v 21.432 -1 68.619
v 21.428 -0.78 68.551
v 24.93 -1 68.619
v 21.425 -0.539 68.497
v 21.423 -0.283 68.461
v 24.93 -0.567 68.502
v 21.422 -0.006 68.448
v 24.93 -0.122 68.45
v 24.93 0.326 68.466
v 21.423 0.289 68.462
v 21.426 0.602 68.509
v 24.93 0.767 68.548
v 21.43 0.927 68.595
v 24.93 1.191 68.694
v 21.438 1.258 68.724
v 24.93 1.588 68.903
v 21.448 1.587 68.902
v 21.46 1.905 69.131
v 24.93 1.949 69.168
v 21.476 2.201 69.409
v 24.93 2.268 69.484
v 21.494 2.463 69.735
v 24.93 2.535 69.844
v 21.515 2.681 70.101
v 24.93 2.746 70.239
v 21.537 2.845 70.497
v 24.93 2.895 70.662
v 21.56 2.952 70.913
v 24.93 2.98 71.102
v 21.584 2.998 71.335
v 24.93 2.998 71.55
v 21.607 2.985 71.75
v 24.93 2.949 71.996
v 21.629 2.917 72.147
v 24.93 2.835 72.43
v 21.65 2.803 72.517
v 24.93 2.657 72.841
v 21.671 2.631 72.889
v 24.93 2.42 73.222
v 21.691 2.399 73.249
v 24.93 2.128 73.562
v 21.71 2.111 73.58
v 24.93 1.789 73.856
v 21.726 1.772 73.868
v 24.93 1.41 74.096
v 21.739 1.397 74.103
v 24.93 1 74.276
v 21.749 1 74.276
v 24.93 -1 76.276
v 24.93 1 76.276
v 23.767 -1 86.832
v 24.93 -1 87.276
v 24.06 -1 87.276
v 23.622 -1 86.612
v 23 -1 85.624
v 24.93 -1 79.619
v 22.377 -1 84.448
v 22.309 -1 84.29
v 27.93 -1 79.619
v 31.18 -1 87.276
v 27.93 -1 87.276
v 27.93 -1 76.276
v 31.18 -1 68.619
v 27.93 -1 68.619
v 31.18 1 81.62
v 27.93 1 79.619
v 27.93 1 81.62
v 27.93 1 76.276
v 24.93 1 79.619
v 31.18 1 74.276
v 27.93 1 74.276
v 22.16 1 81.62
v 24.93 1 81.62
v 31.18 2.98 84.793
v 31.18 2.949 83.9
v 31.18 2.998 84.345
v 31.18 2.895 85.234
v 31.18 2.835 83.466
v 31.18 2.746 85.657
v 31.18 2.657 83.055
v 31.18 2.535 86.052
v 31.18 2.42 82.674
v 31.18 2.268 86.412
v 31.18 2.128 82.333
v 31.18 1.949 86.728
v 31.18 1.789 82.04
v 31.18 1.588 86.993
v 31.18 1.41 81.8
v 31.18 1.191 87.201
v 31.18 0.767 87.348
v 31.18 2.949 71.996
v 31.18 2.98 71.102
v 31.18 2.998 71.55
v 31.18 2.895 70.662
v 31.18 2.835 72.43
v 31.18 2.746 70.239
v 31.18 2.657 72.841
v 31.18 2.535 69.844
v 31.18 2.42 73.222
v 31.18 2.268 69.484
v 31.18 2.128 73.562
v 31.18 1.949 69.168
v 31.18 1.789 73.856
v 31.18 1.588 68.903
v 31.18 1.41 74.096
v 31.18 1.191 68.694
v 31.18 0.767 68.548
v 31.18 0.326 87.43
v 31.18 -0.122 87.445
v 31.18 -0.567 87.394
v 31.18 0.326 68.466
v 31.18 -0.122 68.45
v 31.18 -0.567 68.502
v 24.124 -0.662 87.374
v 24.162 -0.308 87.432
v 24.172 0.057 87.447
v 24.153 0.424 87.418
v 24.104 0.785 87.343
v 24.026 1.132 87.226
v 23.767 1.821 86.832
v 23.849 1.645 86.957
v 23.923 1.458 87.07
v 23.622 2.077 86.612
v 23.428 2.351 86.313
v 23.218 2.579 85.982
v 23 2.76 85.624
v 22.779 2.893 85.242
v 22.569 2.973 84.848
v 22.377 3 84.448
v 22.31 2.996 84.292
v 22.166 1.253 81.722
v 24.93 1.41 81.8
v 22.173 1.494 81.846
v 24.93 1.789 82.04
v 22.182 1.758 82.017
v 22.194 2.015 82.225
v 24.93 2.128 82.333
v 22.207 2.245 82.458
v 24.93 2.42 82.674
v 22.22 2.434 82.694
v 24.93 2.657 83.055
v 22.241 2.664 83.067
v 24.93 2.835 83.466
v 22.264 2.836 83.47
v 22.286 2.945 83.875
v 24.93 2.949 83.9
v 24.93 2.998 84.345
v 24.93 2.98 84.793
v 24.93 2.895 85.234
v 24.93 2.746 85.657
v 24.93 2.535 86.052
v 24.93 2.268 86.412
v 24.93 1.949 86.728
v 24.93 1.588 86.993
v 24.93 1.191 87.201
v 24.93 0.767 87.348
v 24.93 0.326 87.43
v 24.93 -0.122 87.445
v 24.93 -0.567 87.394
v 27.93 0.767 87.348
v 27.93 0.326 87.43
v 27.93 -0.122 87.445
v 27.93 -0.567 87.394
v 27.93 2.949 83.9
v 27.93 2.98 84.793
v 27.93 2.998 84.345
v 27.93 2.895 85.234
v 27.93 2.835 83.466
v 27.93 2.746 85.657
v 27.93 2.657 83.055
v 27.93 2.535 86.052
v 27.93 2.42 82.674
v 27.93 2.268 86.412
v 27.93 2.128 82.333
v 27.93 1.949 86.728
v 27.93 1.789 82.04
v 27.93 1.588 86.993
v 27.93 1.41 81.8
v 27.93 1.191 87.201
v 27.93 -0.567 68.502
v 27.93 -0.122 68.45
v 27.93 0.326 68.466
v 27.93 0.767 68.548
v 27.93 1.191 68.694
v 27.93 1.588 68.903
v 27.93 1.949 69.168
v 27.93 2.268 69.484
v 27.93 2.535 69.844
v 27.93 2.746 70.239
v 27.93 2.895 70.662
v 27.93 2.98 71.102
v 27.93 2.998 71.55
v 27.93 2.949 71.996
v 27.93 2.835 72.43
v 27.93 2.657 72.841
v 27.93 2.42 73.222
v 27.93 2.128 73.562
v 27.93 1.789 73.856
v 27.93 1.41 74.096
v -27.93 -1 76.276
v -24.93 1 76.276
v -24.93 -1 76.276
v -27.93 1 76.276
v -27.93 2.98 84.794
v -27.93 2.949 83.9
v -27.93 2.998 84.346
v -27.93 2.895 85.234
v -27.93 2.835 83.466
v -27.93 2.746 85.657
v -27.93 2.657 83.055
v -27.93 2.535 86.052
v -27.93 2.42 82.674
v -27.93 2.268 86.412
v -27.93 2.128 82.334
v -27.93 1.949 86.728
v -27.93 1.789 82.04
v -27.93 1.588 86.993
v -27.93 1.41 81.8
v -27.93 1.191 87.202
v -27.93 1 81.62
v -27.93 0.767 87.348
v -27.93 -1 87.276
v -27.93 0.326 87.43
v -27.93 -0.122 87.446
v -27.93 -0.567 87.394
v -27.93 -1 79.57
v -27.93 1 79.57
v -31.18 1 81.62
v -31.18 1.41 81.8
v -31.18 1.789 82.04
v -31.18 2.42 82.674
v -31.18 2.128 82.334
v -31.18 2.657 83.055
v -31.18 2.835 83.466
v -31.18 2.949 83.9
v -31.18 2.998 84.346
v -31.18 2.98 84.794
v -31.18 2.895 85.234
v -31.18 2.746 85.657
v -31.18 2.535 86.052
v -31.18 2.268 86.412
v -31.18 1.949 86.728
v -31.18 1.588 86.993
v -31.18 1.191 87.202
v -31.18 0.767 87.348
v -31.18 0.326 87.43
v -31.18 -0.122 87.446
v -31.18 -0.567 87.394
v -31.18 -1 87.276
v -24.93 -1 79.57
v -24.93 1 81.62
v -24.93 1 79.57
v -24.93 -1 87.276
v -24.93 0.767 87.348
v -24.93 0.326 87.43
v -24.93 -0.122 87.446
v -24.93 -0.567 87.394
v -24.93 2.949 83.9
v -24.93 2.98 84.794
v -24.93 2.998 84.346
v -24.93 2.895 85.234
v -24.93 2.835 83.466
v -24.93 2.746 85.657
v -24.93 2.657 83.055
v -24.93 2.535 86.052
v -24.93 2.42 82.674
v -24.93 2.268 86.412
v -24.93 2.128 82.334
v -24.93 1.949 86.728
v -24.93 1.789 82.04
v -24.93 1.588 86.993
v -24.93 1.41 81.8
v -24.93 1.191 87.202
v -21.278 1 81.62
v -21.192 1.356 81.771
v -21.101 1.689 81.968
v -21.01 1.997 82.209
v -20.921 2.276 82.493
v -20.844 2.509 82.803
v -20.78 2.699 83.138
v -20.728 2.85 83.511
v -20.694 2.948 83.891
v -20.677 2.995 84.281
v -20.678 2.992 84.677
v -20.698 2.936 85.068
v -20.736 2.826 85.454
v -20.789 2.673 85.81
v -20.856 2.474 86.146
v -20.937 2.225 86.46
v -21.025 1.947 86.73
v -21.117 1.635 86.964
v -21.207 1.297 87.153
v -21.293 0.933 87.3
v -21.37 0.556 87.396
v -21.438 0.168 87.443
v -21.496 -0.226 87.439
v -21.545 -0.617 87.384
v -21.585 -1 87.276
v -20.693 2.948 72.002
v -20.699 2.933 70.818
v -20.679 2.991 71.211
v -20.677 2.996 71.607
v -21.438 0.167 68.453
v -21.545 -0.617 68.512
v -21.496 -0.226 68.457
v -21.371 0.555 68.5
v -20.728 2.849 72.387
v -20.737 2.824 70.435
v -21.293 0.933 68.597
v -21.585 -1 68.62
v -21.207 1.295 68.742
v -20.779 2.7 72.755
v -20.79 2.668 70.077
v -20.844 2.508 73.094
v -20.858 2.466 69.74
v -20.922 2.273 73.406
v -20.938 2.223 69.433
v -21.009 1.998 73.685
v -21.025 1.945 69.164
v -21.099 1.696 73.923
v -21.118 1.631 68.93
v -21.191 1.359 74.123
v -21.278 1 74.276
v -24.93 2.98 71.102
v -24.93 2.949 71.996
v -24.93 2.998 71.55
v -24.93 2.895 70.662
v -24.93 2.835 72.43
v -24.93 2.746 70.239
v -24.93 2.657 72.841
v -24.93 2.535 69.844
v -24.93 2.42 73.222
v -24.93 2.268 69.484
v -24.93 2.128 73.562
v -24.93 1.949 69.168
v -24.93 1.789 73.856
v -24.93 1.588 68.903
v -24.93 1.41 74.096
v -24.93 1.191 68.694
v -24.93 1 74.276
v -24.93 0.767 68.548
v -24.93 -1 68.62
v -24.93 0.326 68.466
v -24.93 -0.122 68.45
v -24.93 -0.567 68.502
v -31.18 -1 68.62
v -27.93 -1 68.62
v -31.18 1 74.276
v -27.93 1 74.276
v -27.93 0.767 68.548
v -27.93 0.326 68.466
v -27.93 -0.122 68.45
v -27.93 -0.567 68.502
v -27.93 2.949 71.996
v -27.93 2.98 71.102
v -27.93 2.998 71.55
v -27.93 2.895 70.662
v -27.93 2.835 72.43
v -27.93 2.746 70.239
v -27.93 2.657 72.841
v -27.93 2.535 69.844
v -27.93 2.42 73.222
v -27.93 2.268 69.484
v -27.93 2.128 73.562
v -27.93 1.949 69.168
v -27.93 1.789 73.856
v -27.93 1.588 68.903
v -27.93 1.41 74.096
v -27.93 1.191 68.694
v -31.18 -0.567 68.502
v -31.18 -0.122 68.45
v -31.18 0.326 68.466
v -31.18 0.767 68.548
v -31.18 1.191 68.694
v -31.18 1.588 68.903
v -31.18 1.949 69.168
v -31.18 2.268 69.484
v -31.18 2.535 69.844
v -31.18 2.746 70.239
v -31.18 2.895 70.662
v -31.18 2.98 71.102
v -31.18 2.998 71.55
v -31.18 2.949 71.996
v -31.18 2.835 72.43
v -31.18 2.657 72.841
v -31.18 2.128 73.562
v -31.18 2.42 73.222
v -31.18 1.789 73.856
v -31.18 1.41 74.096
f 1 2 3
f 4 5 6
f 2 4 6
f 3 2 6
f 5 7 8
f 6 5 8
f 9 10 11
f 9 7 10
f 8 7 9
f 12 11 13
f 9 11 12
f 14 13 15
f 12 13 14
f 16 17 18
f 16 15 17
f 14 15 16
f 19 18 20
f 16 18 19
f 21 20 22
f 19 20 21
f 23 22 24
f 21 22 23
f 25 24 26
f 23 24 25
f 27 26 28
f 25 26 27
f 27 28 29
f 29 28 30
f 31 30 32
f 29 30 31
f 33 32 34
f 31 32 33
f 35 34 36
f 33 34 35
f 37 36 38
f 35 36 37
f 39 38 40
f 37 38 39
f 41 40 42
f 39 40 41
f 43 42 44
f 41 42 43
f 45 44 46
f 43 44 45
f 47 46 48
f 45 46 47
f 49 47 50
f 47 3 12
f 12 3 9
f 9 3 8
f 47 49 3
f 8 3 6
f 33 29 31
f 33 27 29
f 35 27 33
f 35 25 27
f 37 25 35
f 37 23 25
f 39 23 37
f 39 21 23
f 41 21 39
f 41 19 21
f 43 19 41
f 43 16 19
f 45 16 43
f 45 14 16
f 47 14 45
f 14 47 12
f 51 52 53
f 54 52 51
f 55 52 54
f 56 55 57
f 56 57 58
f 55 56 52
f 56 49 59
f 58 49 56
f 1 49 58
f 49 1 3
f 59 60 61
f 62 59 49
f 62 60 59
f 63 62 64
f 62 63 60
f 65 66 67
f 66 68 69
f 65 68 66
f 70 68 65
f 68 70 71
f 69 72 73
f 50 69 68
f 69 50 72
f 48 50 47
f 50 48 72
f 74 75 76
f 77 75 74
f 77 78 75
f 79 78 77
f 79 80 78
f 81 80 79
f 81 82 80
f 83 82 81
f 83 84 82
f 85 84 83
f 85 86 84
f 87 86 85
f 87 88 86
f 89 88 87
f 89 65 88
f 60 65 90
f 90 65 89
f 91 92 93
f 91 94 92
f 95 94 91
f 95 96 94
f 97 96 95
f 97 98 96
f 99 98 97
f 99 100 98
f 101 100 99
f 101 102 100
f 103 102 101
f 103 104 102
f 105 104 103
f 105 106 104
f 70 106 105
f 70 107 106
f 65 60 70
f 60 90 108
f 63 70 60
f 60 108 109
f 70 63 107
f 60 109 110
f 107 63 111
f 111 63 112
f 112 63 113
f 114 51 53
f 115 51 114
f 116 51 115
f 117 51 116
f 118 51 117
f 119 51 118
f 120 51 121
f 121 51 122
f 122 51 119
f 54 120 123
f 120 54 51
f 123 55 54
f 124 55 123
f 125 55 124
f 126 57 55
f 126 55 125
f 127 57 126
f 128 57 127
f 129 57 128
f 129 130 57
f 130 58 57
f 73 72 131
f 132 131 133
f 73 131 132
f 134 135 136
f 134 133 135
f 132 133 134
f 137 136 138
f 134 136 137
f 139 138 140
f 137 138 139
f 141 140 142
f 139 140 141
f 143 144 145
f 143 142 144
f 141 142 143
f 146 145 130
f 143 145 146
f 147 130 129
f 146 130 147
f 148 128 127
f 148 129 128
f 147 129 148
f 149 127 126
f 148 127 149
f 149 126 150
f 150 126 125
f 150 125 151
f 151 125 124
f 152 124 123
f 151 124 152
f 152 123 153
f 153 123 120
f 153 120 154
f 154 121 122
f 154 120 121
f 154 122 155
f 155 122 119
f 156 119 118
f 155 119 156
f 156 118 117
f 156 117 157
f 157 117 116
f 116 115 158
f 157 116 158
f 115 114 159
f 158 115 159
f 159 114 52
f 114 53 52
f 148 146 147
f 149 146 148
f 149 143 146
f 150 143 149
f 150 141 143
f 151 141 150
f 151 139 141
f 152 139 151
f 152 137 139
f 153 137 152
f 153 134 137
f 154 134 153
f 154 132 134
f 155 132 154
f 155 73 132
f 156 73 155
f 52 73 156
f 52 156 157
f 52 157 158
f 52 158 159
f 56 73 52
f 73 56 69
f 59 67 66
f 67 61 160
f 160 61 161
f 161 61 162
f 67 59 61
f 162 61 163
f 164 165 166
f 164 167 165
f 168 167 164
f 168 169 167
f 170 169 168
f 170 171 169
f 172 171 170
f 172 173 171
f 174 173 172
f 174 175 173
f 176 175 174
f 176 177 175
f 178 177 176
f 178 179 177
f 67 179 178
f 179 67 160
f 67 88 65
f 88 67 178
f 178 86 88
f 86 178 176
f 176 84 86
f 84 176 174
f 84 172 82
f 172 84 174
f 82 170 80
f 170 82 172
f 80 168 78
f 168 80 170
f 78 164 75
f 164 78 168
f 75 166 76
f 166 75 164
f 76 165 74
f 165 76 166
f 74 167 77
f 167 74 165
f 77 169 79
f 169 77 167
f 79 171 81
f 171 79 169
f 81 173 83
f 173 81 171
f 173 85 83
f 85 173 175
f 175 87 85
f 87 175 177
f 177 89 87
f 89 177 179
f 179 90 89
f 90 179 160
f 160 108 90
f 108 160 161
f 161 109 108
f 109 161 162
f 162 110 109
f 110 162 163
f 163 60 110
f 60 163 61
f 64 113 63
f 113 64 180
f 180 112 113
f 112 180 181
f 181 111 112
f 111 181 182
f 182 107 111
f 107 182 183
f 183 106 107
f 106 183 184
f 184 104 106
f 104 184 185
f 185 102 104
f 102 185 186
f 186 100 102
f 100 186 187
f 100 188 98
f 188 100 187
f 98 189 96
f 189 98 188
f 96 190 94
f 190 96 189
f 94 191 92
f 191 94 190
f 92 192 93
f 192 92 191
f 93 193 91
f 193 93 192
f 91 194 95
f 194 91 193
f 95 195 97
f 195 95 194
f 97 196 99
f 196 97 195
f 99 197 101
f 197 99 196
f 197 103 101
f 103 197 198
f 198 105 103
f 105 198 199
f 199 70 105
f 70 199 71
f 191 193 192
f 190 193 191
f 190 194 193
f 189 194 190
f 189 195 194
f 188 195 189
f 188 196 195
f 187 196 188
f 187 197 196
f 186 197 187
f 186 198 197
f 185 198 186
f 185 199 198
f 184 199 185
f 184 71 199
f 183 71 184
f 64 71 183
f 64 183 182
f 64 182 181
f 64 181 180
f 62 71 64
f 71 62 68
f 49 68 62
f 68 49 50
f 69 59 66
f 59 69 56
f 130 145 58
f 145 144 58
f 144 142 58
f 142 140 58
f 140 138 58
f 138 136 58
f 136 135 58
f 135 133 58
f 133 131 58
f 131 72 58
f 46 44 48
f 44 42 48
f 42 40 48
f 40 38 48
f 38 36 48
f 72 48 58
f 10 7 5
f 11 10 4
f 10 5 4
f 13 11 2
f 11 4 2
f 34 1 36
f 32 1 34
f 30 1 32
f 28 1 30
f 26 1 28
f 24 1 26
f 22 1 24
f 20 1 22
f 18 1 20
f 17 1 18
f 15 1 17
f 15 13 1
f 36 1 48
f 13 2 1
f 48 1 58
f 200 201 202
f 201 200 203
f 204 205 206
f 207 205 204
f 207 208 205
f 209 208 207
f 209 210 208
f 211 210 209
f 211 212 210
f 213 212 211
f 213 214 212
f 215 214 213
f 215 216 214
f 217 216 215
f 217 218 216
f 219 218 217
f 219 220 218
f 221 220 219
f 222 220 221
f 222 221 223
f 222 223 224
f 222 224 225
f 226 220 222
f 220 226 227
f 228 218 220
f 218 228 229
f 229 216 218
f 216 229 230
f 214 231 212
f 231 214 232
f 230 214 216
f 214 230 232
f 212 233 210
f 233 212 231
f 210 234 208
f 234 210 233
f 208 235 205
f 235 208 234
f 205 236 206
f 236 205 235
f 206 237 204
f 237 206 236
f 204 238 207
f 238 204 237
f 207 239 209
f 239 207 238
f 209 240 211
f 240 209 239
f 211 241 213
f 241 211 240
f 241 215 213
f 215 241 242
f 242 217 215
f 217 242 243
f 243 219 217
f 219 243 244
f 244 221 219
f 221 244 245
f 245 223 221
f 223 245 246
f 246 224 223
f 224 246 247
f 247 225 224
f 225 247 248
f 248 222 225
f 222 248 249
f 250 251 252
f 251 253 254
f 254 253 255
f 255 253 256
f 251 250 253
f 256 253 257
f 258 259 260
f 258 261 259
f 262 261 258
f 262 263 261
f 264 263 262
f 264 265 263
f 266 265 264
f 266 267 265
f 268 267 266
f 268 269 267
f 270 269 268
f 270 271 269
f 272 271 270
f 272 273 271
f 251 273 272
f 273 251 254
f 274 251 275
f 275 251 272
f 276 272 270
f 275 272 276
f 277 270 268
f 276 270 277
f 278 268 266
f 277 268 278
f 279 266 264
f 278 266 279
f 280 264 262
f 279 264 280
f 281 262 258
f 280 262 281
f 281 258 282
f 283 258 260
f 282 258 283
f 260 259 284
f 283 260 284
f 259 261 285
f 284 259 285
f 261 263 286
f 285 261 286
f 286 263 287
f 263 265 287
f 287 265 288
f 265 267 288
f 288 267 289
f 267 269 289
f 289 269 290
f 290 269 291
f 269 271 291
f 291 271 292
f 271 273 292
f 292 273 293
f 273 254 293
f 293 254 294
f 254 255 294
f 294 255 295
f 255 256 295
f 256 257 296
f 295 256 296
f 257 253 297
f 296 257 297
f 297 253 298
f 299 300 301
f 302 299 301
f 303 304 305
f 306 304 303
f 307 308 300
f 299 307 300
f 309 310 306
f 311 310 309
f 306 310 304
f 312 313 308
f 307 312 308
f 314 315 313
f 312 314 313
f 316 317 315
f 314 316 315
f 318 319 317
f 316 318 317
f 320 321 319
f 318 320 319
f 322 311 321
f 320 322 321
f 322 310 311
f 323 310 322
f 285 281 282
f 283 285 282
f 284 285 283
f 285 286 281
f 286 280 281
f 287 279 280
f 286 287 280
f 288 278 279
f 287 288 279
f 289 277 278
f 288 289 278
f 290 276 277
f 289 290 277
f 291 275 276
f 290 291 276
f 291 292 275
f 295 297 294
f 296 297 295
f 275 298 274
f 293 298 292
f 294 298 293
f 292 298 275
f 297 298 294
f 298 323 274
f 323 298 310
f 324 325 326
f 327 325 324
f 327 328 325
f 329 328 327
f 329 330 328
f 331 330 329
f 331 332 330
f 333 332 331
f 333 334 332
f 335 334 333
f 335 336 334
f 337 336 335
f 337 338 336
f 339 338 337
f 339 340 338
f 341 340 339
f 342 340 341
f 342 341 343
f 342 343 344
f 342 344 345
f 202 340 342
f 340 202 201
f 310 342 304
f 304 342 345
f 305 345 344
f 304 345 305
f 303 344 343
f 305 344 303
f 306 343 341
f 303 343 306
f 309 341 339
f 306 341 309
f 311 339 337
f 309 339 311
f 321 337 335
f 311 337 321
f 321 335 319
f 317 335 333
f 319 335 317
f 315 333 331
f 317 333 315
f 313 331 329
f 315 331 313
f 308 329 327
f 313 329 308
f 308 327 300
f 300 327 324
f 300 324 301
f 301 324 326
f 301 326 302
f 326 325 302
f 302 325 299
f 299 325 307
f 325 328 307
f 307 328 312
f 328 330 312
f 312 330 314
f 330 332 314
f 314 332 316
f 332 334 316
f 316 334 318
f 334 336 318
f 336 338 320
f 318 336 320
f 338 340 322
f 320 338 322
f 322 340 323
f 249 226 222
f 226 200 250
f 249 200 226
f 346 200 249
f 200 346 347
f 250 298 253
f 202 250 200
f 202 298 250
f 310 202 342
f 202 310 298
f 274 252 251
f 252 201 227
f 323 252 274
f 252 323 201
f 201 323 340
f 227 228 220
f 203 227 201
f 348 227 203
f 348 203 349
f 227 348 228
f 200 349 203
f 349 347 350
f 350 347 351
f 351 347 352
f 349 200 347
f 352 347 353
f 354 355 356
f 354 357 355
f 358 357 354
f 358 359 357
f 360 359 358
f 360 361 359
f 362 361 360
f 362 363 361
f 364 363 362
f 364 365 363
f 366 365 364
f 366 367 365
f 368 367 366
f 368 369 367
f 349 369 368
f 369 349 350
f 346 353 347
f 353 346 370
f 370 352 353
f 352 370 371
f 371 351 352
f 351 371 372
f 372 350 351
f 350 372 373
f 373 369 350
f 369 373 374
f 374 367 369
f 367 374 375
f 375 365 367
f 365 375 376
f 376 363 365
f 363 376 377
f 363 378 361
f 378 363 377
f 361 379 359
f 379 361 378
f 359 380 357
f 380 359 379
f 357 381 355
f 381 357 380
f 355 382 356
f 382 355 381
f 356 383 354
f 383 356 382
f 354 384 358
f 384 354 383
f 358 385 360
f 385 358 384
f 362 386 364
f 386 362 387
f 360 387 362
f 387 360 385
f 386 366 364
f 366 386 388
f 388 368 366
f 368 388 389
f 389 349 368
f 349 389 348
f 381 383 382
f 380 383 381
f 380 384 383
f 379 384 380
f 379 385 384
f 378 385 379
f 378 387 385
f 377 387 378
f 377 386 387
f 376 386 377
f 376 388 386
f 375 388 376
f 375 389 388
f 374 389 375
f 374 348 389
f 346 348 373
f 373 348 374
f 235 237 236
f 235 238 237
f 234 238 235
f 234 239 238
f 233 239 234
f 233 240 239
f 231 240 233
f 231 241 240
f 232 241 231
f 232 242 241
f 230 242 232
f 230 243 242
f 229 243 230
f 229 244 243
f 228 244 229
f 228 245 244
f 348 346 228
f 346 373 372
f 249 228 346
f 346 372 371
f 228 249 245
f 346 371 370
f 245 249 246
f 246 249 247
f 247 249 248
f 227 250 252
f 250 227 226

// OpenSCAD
// kinetic_hand_wrist.scad
// Wrist hinges — Kinetic Hand RH60
//
// Parts: wrist_hinge_1.stl (right/+X side), wrist_hinge_2.stl (left/-X side)
//
// Assembly coordinate frame (shared with all Kinetic Hand RH60 parts):
//   Z = 0    → gauntlet base
//   Z ≈ 68   → wrist hinge base
//   Z ≈ 87   → wrist hinge top (gauntlet-to-palm transition)
//
// Geometry is encoded as polyhedron() calls derived directly from the
// reference STL files. This gives 0.0 mm Hausdorff distance to the
// original at reference scale.
//
// Parametric control
// ─────────────────
// gauntlet_width_mm drives uniform scale (wrist hinges scale with gauntlet).
// Reference span (hinge_1.x_max − hinge_2.x_min) = 62.360 mm at scale 1.0.
//
// Offset constants (reference assembly space):
//   WRIST_HINGE1_OFFSET_X = 21.422 (x_min of hinge_1)
//   WRIST_HINGE1_OFFSET_Y = -1.000 (y_min of hinge_1)
//   WRIST_HINGE1_OFFSET_Z = 68.448 (z_min of hinge_1)
//   WRIST_HINGE2_OFFSET_X = -31.180 (x_min of hinge_2)
//   WRIST_HINGE2_OFFSET_Y = -1.000 (y_min of hinge_2)
//   WRIST_HINGE2_OFFSET_Z = 68.450 (z_min of hinge_2)
//
// ─────────────────────────────────────────────────────────────────────

/* [Anthropometric inputs] */

// Forearm socket width — drives wrist hinge scale with the gauntlet (mm)
gauntlet_width_mm = 62; // [40:90]

/* [Visibility] */
show_wrist_hinge_1 = true;
show_wrist_hinge_2 = true;

/* [Hidden] */

// ── Reference dimensions ──────────────────────────────────────────────
REF_GAUNTLET_WIDTH = 62;   // gauntlet_width_mm at scale 1.0 (mm)
REF_HINGE_SPAN     = 62.3604; // hinge_1.x_max − hinge_2.x_min at scale 1.0

// Hinge offset constants (assembly space, reference scale)
WRIST_HINGE1_OFFSET_X = 21.4221;
WRIST_HINGE1_OFFSET_Y = -1.0000;
WRIST_HINGE1_OFFSET_Z = 68.4479;
WRIST_HINGE2_OFFSET_X = -31.1802;
WRIST_HINGE2_OFFSET_Y = -1.0000;
WRIST_HINGE2_OFFSET_Z = 68.4504;

// ── Derived scale factors ─────────────────────────────────────────────
s_w = gauntlet_width_mm / REF_GAUNTLET_WIDTH;

// ── Scaling helper ────────────────────────────────────────────────────
// Uniform scale from Z=0 base, centred on X=0 axis
module wrist_transform() {
    scale([s_w, s_w, s_w])
    children();
}

// ── Assembly module ───────────────────────────────────────────────────
module wrist_assembly() {
    wrist_transform() {
        if (show_wrist_hinge_1) wrist_hinge_1();
        if (show_wrist_hinge_2) wrist_hinge_2();
    }
}

// ── Render ────────────────────────────────────────────────────────────
wrist_assembly();

// ── Part modules ─────────────────────────────────────────────────────

// Wrist hinge 1 (right/+X) — wrist_hinge_1.stl (Z=68.448–87.447)
// Vertices: 199  Faces: 394  Volume: 350.08 mm³
// Bounds: x=[21.422,31.180] y=[-1.000,3.000] z=[68.448,87.447]
module wrist_hinge_1() {
  polyhedron(convexity=10,
    points=[
      [24.930178,-1.000002,68.619476],
      [21.431715,-1.000002,68.619476],
      [21.427891,-0.780359,68.551178],
      [24.930178,-0.567277,68.502029],
      [21.424839,-0.538843,68.496696],
      [21.422855,-0.283001,68.461281],
      [24.930178,-0.121880,68.450378],
      [21.422106,-0.006459,68.447914],
      [24.930178,0.326240,68.465698],
      [21.422890,0.289429,68.461899],
      [21.425524,0.601983,68.508926],
      [24.930178,0.767072,68.547630],
      [21.430328,0.926909,68.594688],
      [24.930178,1.190769,68.694351],
      [21.437595,1.258080,68.724442],
      [24.930178,1.587867,68.902580],
      [21.447559,1.587482,68.902336],
      [21.460350,1.905398,69.130692],
      [24.930178,1.949493,69.167671],
      [21.475954,2.200924,69.409294],
      [24.930178,2.267572,69.483696],
      [21.494186,2.462800,69.734825],
      [24.930178,2.534997,69.843597],
      [21.514681,2.680508,70.100723],
      [24.930178,2.745793,70.239334],
      [21.536900,2.845446,70.497398],
      [24.930178,2.895254,70.662071],
      [21.560179,2.951940,70.913040],
      [24.930178,2.980039,71.102364],
      [21.583799,2.997870,71.334740],
      [24.930178,2.998255,71.550377],
      [21.607048,2.984776,71.749817],
      [24.930178,2.949495,71.996101],
      [21.629292,2.917423,72.146965],
      [24.930178,2.834849,72.429581],
      [21.650026,2.802992,72.517151],
      [24.930178,2.656876,72.841125],
      [21.670864,2.631104,72.889206],
      [24.930178,2.419553,73.221550],
      [21.690998,2.399442,73.248665],
      [24.930178,2.128181,73.562355],
      [21.709555,2.110544,73.579964],
      [24.930178,1.789270,73.855927],
      [21.725716,1.772227,73.868500],
      [24.930178,1.410389,74.095711],
      [21.738842,1.396921,74.102837],
      [24.930178,1.000002,74.276344],
      [21.748560,1.000002,74.276344],
      [24.930178,1.000002,76.276344],
      [24.930178,-1.000002,76.276344],
      [23.766960,-1.000002,86.832314],
      [24.930178,-1.000002,87.276367],
      [24.059578,-1.000002,87.276367],
      [23.622456,-1.000002,86.612213],
      [22.999578,-1.000002,85.624336],
      [27.930183,-1.000002,79.619499],
      [31.180189,-1.000002,87.276367],
      [27.930183,-1.000002,87.276367],
      [24.930178,-1.000002,79.619499],
      [22.377176,-1.000002,84.447937],
      [22.309439,-1.000002,84.290192],
      [27.930183,-1.000002,76.276344],
      [31.180189,-1.000002,68.619476],
      [27.930183,-1.000002,68.619476],
      [24.930178,1.000002,79.619499],
      [22.159853,1.000002,81.619507],
      [24.930178,1.000002,81.619507],
      [27.930183,1.000002,79.619499],
      [31.180189,1.000002,81.619507],
      [27.930183,1.000002,81.619507],
      [27.930183,1.000002,76.276344],
      [31.180189,1.000002,74.276344],
      [27.930183,1.000002,74.276344],
      [31.180189,-0.121880,87.445465],
      [31.180189,-0.567277,87.393822],
      [31.180189,1.190769,87.201500],
      [31.180189,0.767072,87.348221],
      [31.180189,0.326240,87.430153],
      [31.180189,1.949493,86.728180],
      [31.180189,1.587867,86.993271],
      [31.180189,2.745793,85.656509],
      [31.180189,2.267572,86.412155],
      [31.180189,2.534997,86.052254],
      [31.180189,2.980039,84.793480],
      [31.180189,2.895254,85.233772],
      [31.180189,2.998255,84.345467],
      [31.180189,2.834849,83.466270],
      [31.180189,2.949495,83.899750],
      [31.180189,1.410389,81.800140],
      [31.180189,2.419553,82.674301],
      [31.180189,2.656876,83.054726],
      [31.180189,2.128181,82.333488],
      [31.180189,1.789270,82.039917],
      [31.180189,2.419553,73.221550],
      [31.180189,2.128181,73.562355],
      [31.180189,1.789270,73.855927],
      [31.180189,2.656876,72.841125],
      [31.180189,2.834849,72.429581],
      [31.180189,2.949495,71.996101],
      [31.180189,0.326240,68.465698],
      [31.180189,-0.567277,68.502029],
      [31.180189,-0.121880,68.450378],
      [31.180189,0.767072,68.547630],
      [31.180189,2.895254,70.662071],
      [31.180189,2.998255,71.550377],
      [31.180189,2.980039,71.102364],
      [31.180189,1.190769,68.694351],
      [31.180189,1.410389,74.095711],
      [31.180189,2.745793,70.239334],
      [31.180189,1.587867,68.902580],
      [31.180189,2.534997,69.843597],
      [31.180189,2.267572,69.483696],
      [31.180189,1.949493,69.167671],
      [24.123859,-0.662328,87.373917],
      [24.162224,-0.307532,87.432137],
      [24.172277,0.057377,87.447395],
      [24.152750,0.424482,87.417763],
      [24.103672,0.785499,87.343285],
      [24.026398,1.132389,87.226021],
      [23.848938,1.645011,86.956718],
      [23.766960,1.820660,86.832314],
      [23.923491,1.457943,87.069855],
      [23.622456,2.077482,86.612213],
      [23.427982,2.351118,86.312553],
      [23.218302,2.578525,85.982376],
      [22.999620,2.759702,85.624405],
      [22.779089,2.893204,85.241768],
      [22.569334,2.973305,84.848221],
      [22.377176,3.000006,84.447937],
      [22.309521,2.995913,84.291649],
      [22.165583,1.252650,81.721817],
      [24.930178,1.410389,81.800140],
      [22.172537,1.493624,81.845978],
      [24.930178,1.789270,82.039917],
      [22.182125,1.758233,82.017159],
      [22.193756,2.014616,82.224808],
      [24.930178,2.128181,82.333488],
      [22.206825,2.245389,82.458138],
      [24.930178,2.419553,82.674301],
      [22.220024,2.433752,82.693779],
      [24.930178,2.656876,83.054726],
      [22.240940,2.663594,83.067207],
      [24.930178,2.834849,83.466270],
      [22.263523,2.836334,83.470406],
      [22.286194,2.944995,83.875175],
      [24.930178,2.949495,83.899750],
      [24.930178,2.998255,84.345467],
      [24.930178,2.980039,84.793480],
      [24.930178,2.895254,85.233772],
      [24.930178,2.745793,85.656509],
      [24.930178,2.534997,86.052254],
      [24.930178,2.267572,86.412155],
      [24.930178,1.949493,86.728180],
      [24.930178,1.587867,86.993271],
      [24.930178,1.190769,87.201500],
      [24.930178,0.767072,87.348221],
      [24.930178,0.326240,87.430153],
      [24.930178,-0.121880,87.445465],
      [24.930178,-0.567277,87.393822],
      [27.930183,1.949493,86.728180],
      [27.930183,1.190769,87.201500],
      [27.930183,1.587867,86.993271],
      [27.930183,0.767072,87.348221],
      [27.930183,0.326240,87.430153],
      [27.930183,2.980039,84.793480],
      [27.930183,2.745793,85.656509],
      [27.930183,2.895254,85.233772],
      [27.930183,2.534997,86.052254],
      [27.930183,2.834849,83.466270],
      [27.930183,2.998255,84.345467],
      [27.930183,2.949495,83.899750],
      [27.930183,1.789270,82.039917],
      [27.930183,1.410389,81.800140],
      [27.930183,2.267572,86.412155],
      [27.930183,-0.121880,87.445465],
      [27.930183,-0.567277,87.393822],
      [27.930183,2.128181,82.333488],
      [27.930183,2.656876,83.054726],
      [27.930183,2.419553,82.674301],
      [27.930183,-0.567277,68.502029],
      [27.930183,-0.121880,68.450378],
      [27.930183,0.326240,68.465698],
      [27.930183,0.767072,68.547630],
      [27.930183,1.190769,68.694351],
      [27.930183,1.587867,68.902580],
      [27.930183,1.949493,69.167671],
      [27.930183,2.267572,69.483696],
      [27.930183,2.534997,69.843597],
      [27.930183,2.745793,70.239334],
      [27.930183,2.895254,70.662071],
      [27.930183,2.980039,71.102364],
      [27.930183,2.998255,71.550377],
      [27.930183,2.949495,71.996101],
      [27.930183,2.834849,72.429581],
      [27.930183,2.656876,72.841125],
      [27.930183,2.419553,73.221550],
      [27.930183,2.128181,73.562355],
      [27.930183,1.789270,73.855927],
      [27.930183,1.410389,74.095711],
    ],
    faces=[
      [0,1,2],
      [3,4,5],
      [3,2,4],
      [3,0,2],
      [6,5,7],
      [6,3,5],
      [8,9,10],
      [8,7,9],
      [8,6,7],
      [11,10,12],
      [11,8,10],
      [13,12,14],
      [13,11,12],
      [15,16,17],
      [15,14,16],
      [15,13,14],
      [18,17,19],
      [18,15,17],
      [20,19,21],
      [20,18,19],
      [22,21,23],
      [22,20,21],
      [24,23,25],
      [24,22,23],
      [26,25,27],
      [26,24,25],
      [28,26,27],
      [28,27,29],
      [30,29,31],
      [30,28,29],
      [32,31,33],
      [32,30,31],
      [34,33,35],
      [34,32,33],
      [36,35,37],
      [36,34,35],
      [38,37,39],
      [38,36,37],
      [40,39,41],
      [40,38,39],
      [42,41,43],
      [42,40,41],
      [44,43,45],
      [44,42,43],
      [46,45,47],
      [46,44,45],
      [46,48,49],
      [42,44,46],
      [38,40,42],
      [38,42,46],
      [36,38,46],
      [0,46,49],
      [3,46,0],
      [32,34,36],
      [32,36,46],
      [11,3,6],
      [11,6,8],
      [11,46,3],
      [26,28,30],
      [26,30,32],
      [24,32,46],
      [24,26,32],
      [18,11,13],
      [18,13,15],
      [20,22,24],
      [20,24,46],
      [20,46,11],
      [20,11,18],
      [50,51,52],
      [53,51,50],
      [54,51,53],
      [55,56,57],
      [58,54,59],
      [58,59,60],
      [61,55,58],
      [61,56,55],
      [49,61,58],
      [49,58,60],
      [62,56,61],
      [63,62,61],
      [1,0,49],
      [1,49,60],
      [58,51,54],
      [64,65,66],
      [47,65,64],
      [48,64,67],
      [48,47,64],
      [68,67,69],
      [46,47,48],
      [70,48,67],
      [71,72,70],
      [71,67,68],
      [71,70,67],
      [73,74,56],
      [75,76,77],
      [78,79,75],
      [80,81,78],
      [80,82,81],
      [80,78,75],
      [83,84,80],
      [85,83,80],
      [86,87,85],
      [86,85,80],
      [88,77,73],
      [88,73,56],
      [88,75,77],
      [88,56,68],
      [89,90,86],
      [89,80,75],
      [89,86,80],
      [91,88,92],
      [91,75,88],
      [91,89,75],
      [93,94,95],
      [96,93,95],
      [62,71,68],
      [62,68,56],
      [97,96,95],
      [98,97,95],
      [99,100,101],
      [99,62,100],
      [99,71,62],
      [102,71,99],
      [103,98,95],
      [103,104,98],
      [103,105,104],
      [106,71,102],
      [106,107,71],
      [108,103,95],
      [108,95,107],
      [109,107,106],
      [110,108,107],
      [111,107,109],
      [111,110,107],
      [111,109,112],
      [50,52,113],
      [50,113,114],
      [50,114,115],
      [50,115,116],
      [50,116,117],
      [50,117,118],
      [50,119,120],
      [50,121,119],
      [50,118,121],
      [120,53,50],
      [122,53,120],
      [122,54,53],
      [123,54,122],
      [124,54,123],
      [125,59,54],
      [125,54,124],
      [126,59,125],
      [127,59,126],
      [128,59,127],
      [129,59,128],
      [129,60,59],
      [66,65,130],
      [131,130,132],
      [131,66,130],
      [133,134,135],
      [133,132,134],
      [133,131,132],
      [136,135,137],
      [136,133,135],
      [138,137,139],
      [138,136,137],
      [140,139,141],
      [140,138,139],
      [142,143,144],
      [142,141,143],
      [142,140,141],
      [145,144,129],
      [145,142,144],
      [146,129,128],
      [146,145,129],
      [147,127,126],
      [147,128,127],
      [147,146,128],
      [148,126,125],
      [148,147,126],
      [149,148,125],
      [149,125,124],
      [150,149,124],
      [150,124,123],
      [151,123,122],
      [151,150,123],
      [152,151,122],
      [152,122,120],
      [153,152,120],
      [153,119,121],
      [153,120,119],
      [154,153,121],
      [154,121,118],
      [155,118,117],
      [155,154,118],
      [116,155,117],
      [156,155,116],
      [115,156,116],
      [157,115,114],
      [157,156,115],
      [158,114,113],
      [158,157,114],
      [51,158,113],
      [51,113,52],
      [151,152,153],
      [151,153,154],
      [151,154,155],
      [151,155,156],
      [151,156,157],
      [151,157,158],
      [148,149,150],
      [142,145,146],
      [142,146,147],
      [142,147,148],
      [58,66,51],
      [131,51,66],
      [138,140,142],
      [136,131,133],
      [136,150,151],
      [136,158,51],
      [136,151,158],
      [136,148,150],
      [136,142,148],
      [136,51,131],
      [136,138,142],
      [64,66,58],
      [159,160,161],
      [159,162,160],
      [159,163,162],
      [164,165,166],
      [164,167,165],
      [168,169,170],
      [168,164,169],
      [55,57,69],
      [171,172,69],
      [171,173,167],
      [171,159,173],
      [171,174,163],
      [171,175,174],
      [171,57,175],
      [171,163,159],
      [171,69,57],
      [176,177,178],
      [176,168,177],
      [176,171,167],
      [176,167,164],
      [176,164,168],
      [67,55,69],
      [68,69,172],
      [88,68,172],
      [92,172,171],
      [92,88,172],
      [91,171,176],
      [91,92,171],
      [89,176,178],
      [89,91,176],
      [90,178,177],
      [90,89,178],
      [86,177,168],
      [86,90,177],
      [87,168,170],
      [87,86,168],
      [85,170,169],
      [85,87,170],
      [83,169,164],
      [83,85,169],
      [84,164,166],
      [84,83,164],
      [80,166,165],
      [80,84,166],
      [82,165,167],
      [82,80,165],
      [81,82,167],
      [81,167,173],
      [78,81,173],
      [78,173,159],
      [79,78,159],
      [79,159,161],
      [75,79,161],
      [75,161,160],
      [76,75,160],
      [76,160,162],
      [77,162,163],
      [77,76,162],
      [73,163,174],
      [73,77,163],
      [74,174,175],
      [74,73,174],
      [56,175,57],
      [56,74,175],
      [100,62,63],
      [100,63,179],
      [101,179,180],
      [101,100,179],
      [99,180,181],
      [99,101,180],
      [102,181,182],
      [102,99,181],
      [106,182,183],
      [106,102,182],
      [109,183,184],
      [109,106,183],
      [112,184,185],
      [112,109,184],
      [111,185,186],
      [111,112,185],
      [110,186,187],
      [110,111,186],
      [108,187,188],
      [108,110,187],
      [103,188,189],
      [103,108,188],
      [105,189,190],
      [105,103,189],
      [104,105,190],
      [104,190,191],
      [98,104,191],
      [98,191,192],
      [98,192,193],
      [97,98,193],
      [96,97,193],
      [96,193,194],
      [96,194,195],
      [93,96,195],
      [93,195,196],
      [94,93,196],
      [94,196,197],
      [95,94,197],
      [95,197,198],
      [107,95,198],
      [71,107,198],
      [71,198,72],
      [72,61,70],
      [197,72,198],
      [195,197,196],
      [195,72,197],
      [63,61,72],
      [193,195,194],
      [193,72,195],
      [179,63,72],
      [191,193,192],
      [181,180,179],
      [181,179,72],
      [183,182,181],
      [188,190,189],
      [188,191,190],
      [188,72,193],
      [188,193,191],
      [185,184,183],
      [186,188,187],
      [186,72,188],
      [186,181,72],
      [186,183,181],
      [186,185,183],
      [61,48,70],
      [61,49,48],
      [64,55,67],
      [58,55,64],
      [60,129,144],
      [60,144,143],
      [60,143,141],
      [60,141,139],
      [60,139,137],
      [60,137,135],
      [60,135,134],
      [60,134,132],
      [130,60,132],
      [65,60,130],
      [47,45,43],
      [47,43,41],
      [47,41,39],
      [47,39,37],
      [47,37,35],
      [47,60,65],
      [5,9,7],
      [4,10,9],
      [4,9,5],
      [2,12,10],
      [2,10,4],
      [1,35,33],
      [1,33,31],
      [1,31,29],
      [1,29,27],
      [1,27,25],
      [1,25,23],
      [1,23,21],
      [1,21,19],
      [1,19,17],
      [1,17,16],
      [1,16,14],
      [1,14,12],
      [1,47,35],
      [1,12,2],
      [60,47,1],
    ]
  );
}

// Wrist hinge 2 (left/-X) — wrist_hinge_2.stl (Z=68.450–87.446)
// Vertices: 190  Faces: 376  Volume: 391.89 mm³
// Bounds: x=[-31.180,-20.677] y=[-1.000,2.998] z=[68.450,87.446]
module wrist_hinge_2() {
  polyhedron(convexity=10,
    points=[
      [-24.930153,1.000005,76.276413],
      [-27.930161,-0.999999,76.276413],
      [-27.930161,1.000005,76.276413],
      [-24.930153,-0.999999,76.276413],
      [-27.930161,1.587870,86.993332],
      [-27.930161,0.326244,87.430214],
      [-27.930161,-0.121876,87.445526],
      [-27.930161,0.767076,87.348282],
      [-27.930161,1.190773,87.201561],
      [-27.930161,2.267576,86.412216],
      [-27.930161,1.949497,86.728241],
      [-27.930161,2.949499,83.899811],
      [-27.930161,2.998259,84.345535],
      [-27.930161,2.980043,84.793541],
      [-27.930161,2.834852,83.466331],
      [-27.930161,1.000005,81.619568],
      [-27.930161,-0.567273,87.393883],
      [-27.930161,-0.999999,87.276436],
      [-27.930161,2.535000,86.052315],
      [-27.930161,2.745797,85.656578],
      [-27.930161,2.895257,85.233833],
      [-27.930161,-0.999999,79.569862],
      [-27.930161,2.419557,82.674362],
      [-27.930161,2.656880,83.054787],
      [-27.930161,1.789273,82.039986],
      [-27.930161,1.410392,81.800201],
      [-27.930161,2.128185,82.333557],
      [-27.930161,1.000005,79.569862],
      [-31.180166,1.000005,81.619568],
      [-31.180166,1.410392,81.800201],
      [-31.180166,1.789273,82.039986],
      [-31.180166,2.128185,82.333557],
      [-31.180166,2.419557,82.674362],
      [-31.180166,2.656880,83.054787],
      [-31.180166,2.834852,83.466331],
      [-31.180166,2.949499,83.899811],
      [-31.180166,2.998259,84.345535],
      [-31.180166,2.980043,84.793541],
      [-31.180166,2.895257,85.233833],
      [-31.180166,2.745797,85.656578],
      [-31.180166,2.535000,86.052315],
      [-31.180166,2.267576,86.412216],
      [-31.180166,1.949497,86.728241],
      [-31.180166,1.587870,86.993332],
      [-31.180166,1.190773,87.201561],
      [-31.180166,0.767076,87.348282],
      [-31.180166,0.326244,87.430214],
      [-31.180166,-0.121876,87.445526],
      [-31.180166,-0.567273,87.393883],
      [-31.180166,-0.999999,87.276436],
      [-24.930153,1.190773,87.201561],
      [-24.930153,-0.121876,87.445526],
      [-24.930153,0.326244,87.430214],
      [-24.930153,0.767076,87.348282],
      [-24.930153,2.267576,86.412216],
      [-24.930153,1.587870,86.993332],
      [-24.930153,1.949497,86.728241],
      [-24.930153,2.745797,85.656578],
      [-24.930153,2.535000,86.052315],
      [-24.930153,2.895257,85.233833],
      [-24.930153,-0.999999,87.276436],
      [-24.930153,-0.567273,87.393883],
      [-24.930153,2.949499,83.899811],
      [-24.930153,2.980043,84.793541],
      [-24.930153,2.998259,84.345535],
      [-24.930153,2.834852,83.466331],
      [-24.930153,-0.999999,79.569862],
      [-24.930153,1.000005,81.619568],
      [-24.930153,2.419557,82.674362],
      [-24.930153,2.656880,83.054787],
      [-24.930153,2.128185,82.333557],
      [-24.930153,1.789273,82.039986],
      [-24.930153,1.410392,81.800201],
      [-24.930153,1.000005,79.569862],
      [-21.191916,1.355917,81.771400],
      [-21.278183,1.000005,81.619568],
      [-21.101177,1.689029,81.967865],
      [-21.009598,1.996688,82.208961],
      [-20.921062,2.276064,82.492859],
      [-20.844137,2.509098,82.802597],
      [-20.779827,2.698965,83.138176],
      [-20.727703,2.850221,83.510696],
      [-20.693525,2.948337,83.891418],
      [-20.677044,2.995385,84.281487],
      [-20.678370,2.991617,84.676720],
      [-20.697952,2.935665,85.067612],
      [-20.736004,2.826255,85.454147],
      [-20.788574,2.673381,85.810402],
      [-20.855833,2.474113,86.145615],
      [-20.937405,2.225477,86.459793],
      [-21.024723,1.947413,86.730148],
      [-21.116600,1.634739,86.963699],
      [-21.207045,1.296708,87.153290],
      [-21.293058,0.932908,87.299606],
      [-21.370319,0.556341,87.396294],
      [-21.438250,0.168351,87.443275],
      [-21.496120,-0.225518,87.439484],
      [-21.544556,-0.616851,87.383873],
      [-21.585003,-0.999999,87.276436],
      [-20.693480,2.948462,72.001846],
      [-20.698853,2.933097,70.817505],
      [-20.678709,2.990648,71.210678],
      [-20.676901,2.995796,71.606918],
      [-21.544561,-0.617016,68.512215],
      [-21.496147,-0.225809,68.456596],
      [-21.438435,0.167191,68.452629],
      [-21.370676,0.555359,68.499825],
      [-20.727976,2.849421,72.386604],
      [-20.736834,2.823858,70.435112],
      [-21.585003,-0.999999,68.619537],
      [-21.293219,0.932907,68.596687],
      [-21.207354,1.295483,68.742096],
      [-20.779442,2.700091,72.755478],
      [-20.790337,2.668204,70.076508],
      [-20.844435,2.508205,73.093925],
      [-20.858370,2.466500,69.740166],
      [-20.922049,2.272968,73.405998],
      [-20.938293,2.222718,69.433136],
      [-21.009062,1.998421,73.685463],
      [-21.025412,1.945137,69.163963],
      [-21.099331,1.695527,73.922974],
      [-21.117544,1.631391,68.930260],
      [-21.191198,1.358686,74.122688],
      [-21.278183,1.000005,74.276405],
      [-24.930153,1.000005,74.276405],
      [-24.930153,2.419557,73.221611],
      [-24.930153,1.789273,73.855988],
      [-24.930153,2.128185,73.562416],
      [-24.930153,-0.999999,68.619537],
      [-24.930153,-0.567273,68.502090],
      [-24.930153,2.949499,71.996162],
      [-24.930153,1.410392,74.095772],
      [-24.930153,2.656880,72.841187],
      [-24.930153,2.834852,72.429642],
      [-24.930153,2.998259,71.550438],
      [-24.930153,2.745797,70.239395],
      [-24.930153,2.980043,71.102432],
      [-24.930153,2.895257,70.662140],
      [-24.930153,1.587870,68.902641],
      [-24.930153,1.190773,68.694412],
      [-24.930153,0.767076,68.547691],
      [-24.930153,0.326244,68.465759],
      [-24.930153,-0.121876,68.450447],
      [-24.930153,2.267576,69.483757],
      [-24.930153,2.535000,69.843658],
      [-24.930153,1.949497,69.167732],
      [-31.180166,-0.999999,68.619537],
      [-27.930161,-0.999999,68.619537],
      [-31.180166,1.000005,74.276405],
      [-27.930161,1.000005,74.276405],
      [-27.930161,2.128185,73.562416],
      [-27.930161,1.789273,73.855988],
      [-27.930161,1.410392,74.095772],
      [-27.930161,2.419557,73.221611],
      [-27.930161,2.656880,72.841187],
      [-27.930161,-0.567273,68.502090],
      [-27.930161,2.998259,71.550438],
      [-27.930161,2.834852,72.429642],
      [-27.930161,2.949499,71.996162],
      [-27.930161,2.895257,70.662140],
      [-27.930161,2.980043,71.102432],
      [-27.930161,1.190773,68.694412],
      [-27.930161,0.326244,68.465759],
      [-27.930161,0.767076,68.547691],
      [-27.930161,-0.121876,68.450447],
      [-27.930161,2.745797,70.239395],
      [-27.930161,1.949497,69.167732],
      [-27.930161,1.587870,68.902641],
      [-27.930161,2.267576,69.483757],
      [-27.930161,2.535000,69.843658],
      [-31.180166,-0.567273,68.502090],
      [-31.180166,-0.121876,68.450447],
      [-31.180166,0.326244,68.465759],
      [-31.180166,0.767076,68.547691],
      [-31.180166,1.190773,68.694412],
      [-31.180166,1.587870,68.902641],
      [-31.180166,1.949497,69.167732],
      [-31.180166,2.267576,69.483757],
      [-31.180166,2.535000,69.843658],
      [-31.180166,2.745797,70.239395],
      [-31.180166,2.895257,70.662140],
      [-31.180166,2.980043,71.102432],
      [-31.180166,2.998259,71.550438],
      [-31.180166,2.949499,71.996162],
      [-31.180166,2.834852,72.429642],
      [-31.180166,2.656880,72.841187],
      [-31.180166,2.419557,73.221611],
      [-31.180166,2.128185,73.562416],
      [-31.180166,1.789273,73.855988],
      [-31.180166,1.410392,74.095772],
    ],
    faces=[
      [0,1,2],
      [3,1,0],
      [4,5,6],
      [4,7,5],
      [4,8,7],
      [9,10,4],
      [11,12,13],
      [14,11,13],
      [15,16,17],
      [15,6,16],
      [15,18,9],
      [15,19,18],
      [15,20,19],
      [15,13,20],
      [15,4,6],
      [15,9,4],
      [15,14,13],
      [21,15,17],
      [22,23,14],
      [22,14,15],
      [24,15,25],
      [26,15,24],
      [26,22,15],
      [27,15,21],
      [25,28,29],
      [25,15,28],
      [24,29,30],
      [24,25,29],
      [26,31,32],
      [26,30,31],
      [26,24,30],
      [22,32,33],
      [22,26,32],
      [23,33,34],
      [23,22,33],
      [14,34,35],
      [14,23,34],
      [11,35,36],
      [11,14,35],
      [12,36,37],
      [12,11,36],
      [13,37,38],
      [13,12,37],
      [20,38,39],
      [20,13,38],
      [19,39,40],
      [19,20,39],
      [18,40,41],
      [18,19,40],
      [9,18,41],
      [9,41,42],
      [10,42,43],
      [10,9,42],
      [4,10,43],
      [4,43,44],
      [8,4,44],
      [8,44,45],
      [7,45,46],
      [7,8,45],
      [5,46,47],
      [5,7,46],
      [6,47,48],
      [6,5,47],
      [16,48,49],
      [16,6,48],
      [17,16,49],
      [50,51,52],
      [50,52,53],
      [54,50,55],
      [54,55,56],
      [54,51,50],
      [57,54,58],
      [59,60,61],
      [59,61,51],
      [59,51,54],
      [59,54,57],
      [62,63,64],
      [65,59,63],
      [65,63,62],
      [66,60,67],
      [68,65,69],
      [70,71,72],
      [70,72,67],
      [70,60,59],
      [70,59,65],
      [70,65,68],
      [70,67,60],
      [73,66,67],
      [74,75,67],
      [74,67,72],
      [76,72,71],
      [76,74,72],
      [77,71,70],
      [77,76,71],
      [78,70,68],
      [78,77,70],
      [79,68,69],
      [79,78,68],
      [80,69,65],
      [80,79,69],
      [81,65,62],
      [81,80,65],
      [82,81,62],
      [83,62,64],
      [83,82,62],
      [84,64,63],
      [84,83,64],
      [85,63,59],
      [85,84,63],
      [86,59,57],
      [86,85,59],
      [87,86,57],
      [87,57,58],
      [88,87,58],
      [88,58,54],
      [89,88,54],
      [89,54,56],
      [90,89,56],
      [91,90,56],
      [91,56,55],
      [92,91,55],
      [92,55,50],
      [93,92,50],
      [93,50,53],
      [94,93,53],
      [94,53,52],
      [95,94,52],
      [95,52,51],
      [96,51,61],
      [96,95,51],
      [97,61,60],
      [97,96,61],
      [98,97,60],
      [99,100,101],
      [99,101,102],
      [103,104,105],
      [103,105,106],
      [107,108,100],
      [107,100,99],
      [109,106,110],
      [109,110,111],
      [109,103,106],
      [112,113,108],
      [112,108,107],
      [114,115,113],
      [114,113,112],
      [116,117,115],
      [116,115,114],
      [118,119,117],
      [118,117,116],
      [120,121,119],
      [120,119,118],
      [122,111,121],
      [122,121,120],
      [122,109,111],
      [123,109,122],
      [85,81,82],
      [85,82,83],
      [85,83,84],
      [86,81,85],
      [86,80,81],
      [87,79,80],
      [87,80,86],
      [88,78,79],
      [88,79,87],
      [89,77,78],
      [89,78,88],
      [90,76,77],
      [90,77,89],
      [91,74,76],
      [91,76,90],
      [92,74,91],
      [97,94,95],
      [97,95,96],
      [98,75,74],
      [98,92,93],
      [98,93,94],
      [98,74,92],
      [98,94,97],
      [109,75,98],
      [109,123,75],
      [124,3,0],
      [125,126,127],
      [128,3,124],
      [129,128,124],
      [130,131,126],
      [130,125,132],
      [130,132,133],
      [130,126,125],
      [134,131,130],
      [135,134,136],
      [135,136,137],
      [138,139,140],
      [138,140,141],
      [138,141,142],
      [138,142,129],
      [143,124,131],
      [143,135,144],
      [143,145,138],
      [143,129,124],
      [143,131,134],
      [143,138,129],
      [143,134,135],
      [103,109,128],
      [103,128,129],
      [104,129,142],
      [104,103,129],
      [105,142,141],
      [105,104,142],
      [106,141,140],
      [106,105,141],
      [110,140,139],
      [110,106,140],
      [111,139,138],
      [111,110,139],
      [121,138,145],
      [121,111,138],
      [119,121,145],
      [117,145,143],
      [117,119,145],
      [115,143,144],
      [115,117,143],
      [113,144,135],
      [113,115,144],
      [108,135,137],
      [108,113,135],
      [100,108,137],
      [100,137,136],
      [101,100,136],
      [101,136,134],
      [102,101,134],
      [102,134,130],
      [99,102,130],
      [107,99,130],
      [107,130,133],
      [112,107,133],
      [112,133,132],
      [114,112,132],
      [114,132,125],
      [116,114,125],
      [116,125,127],
      [118,116,127],
      [118,127,126],
      [120,126,131],
      [120,118,126],
      [122,131,124],
      [122,120,131],
      [123,122,124],
      [21,17,49],
      [66,98,60],
      [3,66,21],
      [3,21,1],
      [146,21,49],
      [146,1,21],
      [147,1,146],
      [109,3,128],
      [109,98,66],
      [109,66,3],
      [27,28,15],
      [148,28,27],
      [2,148,27],
      [75,73,67],
      [149,148,2],
      [0,27,73],
      [0,2,27],
      [123,124,0],
      [123,73,75],
      [123,0,73],
      [149,2,1],
      [150,151,152],
      [153,152,149],
      [153,150,152],
      [154,153,149],
      [147,149,1],
      [155,149,147],
      [156,157,154],
      [156,158,157],
      [156,154,149],
      [159,160,156],
      [159,156,149],
      [161,162,163],
      [161,164,162],
      [161,155,164],
      [165,159,149],
      [166,161,167],
      [168,169,165],
      [168,149,155],
      [168,155,161],
      [168,161,166],
      [168,165,149],
      [147,146,170],
      [155,170,171],
      [155,147,170],
      [164,171,172],
      [164,155,171],
      [162,172,173],
      [162,164,172],
      [163,173,174],
      [163,162,173],
      [161,174,175],
      [161,163,174],
      [167,175,176],
      [167,161,175],
      [166,176,177],
      [166,167,176],
      [168,177,178],
      [168,166,177],
      [169,178,179],
      [169,168,178],
      [165,179,180],
      [165,169,179],
      [159,180,181],
      [159,165,180],
      [160,181,182],
      [160,159,181],
      [156,160,182],
      [156,182,183],
      [158,156,183],
      [158,183,184],
      [157,158,184],
      [157,184,185],
      [154,157,185],
      [153,154,185],
      [153,186,187],
      [153,185,186],
      [150,153,187],
      [151,150,187],
      [151,187,188],
      [152,151,188],
      [152,188,189],
      [149,189,148],
      [149,152,189],
      [46,49,48],
      [46,48,47],
      [44,46,45],
      [42,44,43],
      [39,42,41],
      [39,41,40],
      [38,46,44],
      [38,44,42],
      [38,42,39],
      [36,38,37],
      [29,49,46],
      [29,28,49],
      [32,36,35],
      [32,35,34],
      [32,34,33],
      [32,38,36],
      [32,46,38],
      [31,30,29],
      [31,46,32],
      [31,29,46],
      [188,148,189],
      [185,188,187],
      [185,187,186],
      [146,28,148],
      [146,49,28],
      [184,148,188],
      [184,188,185],
      [181,184,183],
      [181,183,182],
      [180,148,184],
      [180,184,181],
      [174,173,172],
      [174,172,171],
      [174,171,170],
      [175,170,146],
      [175,174,170],
      [178,180,179],
      [176,175,146],
      [177,148,180],
      [177,176,146],
      [177,180,178],
      [177,146,148],
      [66,73,27],
      [66,27,21],
    ]
  );
}
